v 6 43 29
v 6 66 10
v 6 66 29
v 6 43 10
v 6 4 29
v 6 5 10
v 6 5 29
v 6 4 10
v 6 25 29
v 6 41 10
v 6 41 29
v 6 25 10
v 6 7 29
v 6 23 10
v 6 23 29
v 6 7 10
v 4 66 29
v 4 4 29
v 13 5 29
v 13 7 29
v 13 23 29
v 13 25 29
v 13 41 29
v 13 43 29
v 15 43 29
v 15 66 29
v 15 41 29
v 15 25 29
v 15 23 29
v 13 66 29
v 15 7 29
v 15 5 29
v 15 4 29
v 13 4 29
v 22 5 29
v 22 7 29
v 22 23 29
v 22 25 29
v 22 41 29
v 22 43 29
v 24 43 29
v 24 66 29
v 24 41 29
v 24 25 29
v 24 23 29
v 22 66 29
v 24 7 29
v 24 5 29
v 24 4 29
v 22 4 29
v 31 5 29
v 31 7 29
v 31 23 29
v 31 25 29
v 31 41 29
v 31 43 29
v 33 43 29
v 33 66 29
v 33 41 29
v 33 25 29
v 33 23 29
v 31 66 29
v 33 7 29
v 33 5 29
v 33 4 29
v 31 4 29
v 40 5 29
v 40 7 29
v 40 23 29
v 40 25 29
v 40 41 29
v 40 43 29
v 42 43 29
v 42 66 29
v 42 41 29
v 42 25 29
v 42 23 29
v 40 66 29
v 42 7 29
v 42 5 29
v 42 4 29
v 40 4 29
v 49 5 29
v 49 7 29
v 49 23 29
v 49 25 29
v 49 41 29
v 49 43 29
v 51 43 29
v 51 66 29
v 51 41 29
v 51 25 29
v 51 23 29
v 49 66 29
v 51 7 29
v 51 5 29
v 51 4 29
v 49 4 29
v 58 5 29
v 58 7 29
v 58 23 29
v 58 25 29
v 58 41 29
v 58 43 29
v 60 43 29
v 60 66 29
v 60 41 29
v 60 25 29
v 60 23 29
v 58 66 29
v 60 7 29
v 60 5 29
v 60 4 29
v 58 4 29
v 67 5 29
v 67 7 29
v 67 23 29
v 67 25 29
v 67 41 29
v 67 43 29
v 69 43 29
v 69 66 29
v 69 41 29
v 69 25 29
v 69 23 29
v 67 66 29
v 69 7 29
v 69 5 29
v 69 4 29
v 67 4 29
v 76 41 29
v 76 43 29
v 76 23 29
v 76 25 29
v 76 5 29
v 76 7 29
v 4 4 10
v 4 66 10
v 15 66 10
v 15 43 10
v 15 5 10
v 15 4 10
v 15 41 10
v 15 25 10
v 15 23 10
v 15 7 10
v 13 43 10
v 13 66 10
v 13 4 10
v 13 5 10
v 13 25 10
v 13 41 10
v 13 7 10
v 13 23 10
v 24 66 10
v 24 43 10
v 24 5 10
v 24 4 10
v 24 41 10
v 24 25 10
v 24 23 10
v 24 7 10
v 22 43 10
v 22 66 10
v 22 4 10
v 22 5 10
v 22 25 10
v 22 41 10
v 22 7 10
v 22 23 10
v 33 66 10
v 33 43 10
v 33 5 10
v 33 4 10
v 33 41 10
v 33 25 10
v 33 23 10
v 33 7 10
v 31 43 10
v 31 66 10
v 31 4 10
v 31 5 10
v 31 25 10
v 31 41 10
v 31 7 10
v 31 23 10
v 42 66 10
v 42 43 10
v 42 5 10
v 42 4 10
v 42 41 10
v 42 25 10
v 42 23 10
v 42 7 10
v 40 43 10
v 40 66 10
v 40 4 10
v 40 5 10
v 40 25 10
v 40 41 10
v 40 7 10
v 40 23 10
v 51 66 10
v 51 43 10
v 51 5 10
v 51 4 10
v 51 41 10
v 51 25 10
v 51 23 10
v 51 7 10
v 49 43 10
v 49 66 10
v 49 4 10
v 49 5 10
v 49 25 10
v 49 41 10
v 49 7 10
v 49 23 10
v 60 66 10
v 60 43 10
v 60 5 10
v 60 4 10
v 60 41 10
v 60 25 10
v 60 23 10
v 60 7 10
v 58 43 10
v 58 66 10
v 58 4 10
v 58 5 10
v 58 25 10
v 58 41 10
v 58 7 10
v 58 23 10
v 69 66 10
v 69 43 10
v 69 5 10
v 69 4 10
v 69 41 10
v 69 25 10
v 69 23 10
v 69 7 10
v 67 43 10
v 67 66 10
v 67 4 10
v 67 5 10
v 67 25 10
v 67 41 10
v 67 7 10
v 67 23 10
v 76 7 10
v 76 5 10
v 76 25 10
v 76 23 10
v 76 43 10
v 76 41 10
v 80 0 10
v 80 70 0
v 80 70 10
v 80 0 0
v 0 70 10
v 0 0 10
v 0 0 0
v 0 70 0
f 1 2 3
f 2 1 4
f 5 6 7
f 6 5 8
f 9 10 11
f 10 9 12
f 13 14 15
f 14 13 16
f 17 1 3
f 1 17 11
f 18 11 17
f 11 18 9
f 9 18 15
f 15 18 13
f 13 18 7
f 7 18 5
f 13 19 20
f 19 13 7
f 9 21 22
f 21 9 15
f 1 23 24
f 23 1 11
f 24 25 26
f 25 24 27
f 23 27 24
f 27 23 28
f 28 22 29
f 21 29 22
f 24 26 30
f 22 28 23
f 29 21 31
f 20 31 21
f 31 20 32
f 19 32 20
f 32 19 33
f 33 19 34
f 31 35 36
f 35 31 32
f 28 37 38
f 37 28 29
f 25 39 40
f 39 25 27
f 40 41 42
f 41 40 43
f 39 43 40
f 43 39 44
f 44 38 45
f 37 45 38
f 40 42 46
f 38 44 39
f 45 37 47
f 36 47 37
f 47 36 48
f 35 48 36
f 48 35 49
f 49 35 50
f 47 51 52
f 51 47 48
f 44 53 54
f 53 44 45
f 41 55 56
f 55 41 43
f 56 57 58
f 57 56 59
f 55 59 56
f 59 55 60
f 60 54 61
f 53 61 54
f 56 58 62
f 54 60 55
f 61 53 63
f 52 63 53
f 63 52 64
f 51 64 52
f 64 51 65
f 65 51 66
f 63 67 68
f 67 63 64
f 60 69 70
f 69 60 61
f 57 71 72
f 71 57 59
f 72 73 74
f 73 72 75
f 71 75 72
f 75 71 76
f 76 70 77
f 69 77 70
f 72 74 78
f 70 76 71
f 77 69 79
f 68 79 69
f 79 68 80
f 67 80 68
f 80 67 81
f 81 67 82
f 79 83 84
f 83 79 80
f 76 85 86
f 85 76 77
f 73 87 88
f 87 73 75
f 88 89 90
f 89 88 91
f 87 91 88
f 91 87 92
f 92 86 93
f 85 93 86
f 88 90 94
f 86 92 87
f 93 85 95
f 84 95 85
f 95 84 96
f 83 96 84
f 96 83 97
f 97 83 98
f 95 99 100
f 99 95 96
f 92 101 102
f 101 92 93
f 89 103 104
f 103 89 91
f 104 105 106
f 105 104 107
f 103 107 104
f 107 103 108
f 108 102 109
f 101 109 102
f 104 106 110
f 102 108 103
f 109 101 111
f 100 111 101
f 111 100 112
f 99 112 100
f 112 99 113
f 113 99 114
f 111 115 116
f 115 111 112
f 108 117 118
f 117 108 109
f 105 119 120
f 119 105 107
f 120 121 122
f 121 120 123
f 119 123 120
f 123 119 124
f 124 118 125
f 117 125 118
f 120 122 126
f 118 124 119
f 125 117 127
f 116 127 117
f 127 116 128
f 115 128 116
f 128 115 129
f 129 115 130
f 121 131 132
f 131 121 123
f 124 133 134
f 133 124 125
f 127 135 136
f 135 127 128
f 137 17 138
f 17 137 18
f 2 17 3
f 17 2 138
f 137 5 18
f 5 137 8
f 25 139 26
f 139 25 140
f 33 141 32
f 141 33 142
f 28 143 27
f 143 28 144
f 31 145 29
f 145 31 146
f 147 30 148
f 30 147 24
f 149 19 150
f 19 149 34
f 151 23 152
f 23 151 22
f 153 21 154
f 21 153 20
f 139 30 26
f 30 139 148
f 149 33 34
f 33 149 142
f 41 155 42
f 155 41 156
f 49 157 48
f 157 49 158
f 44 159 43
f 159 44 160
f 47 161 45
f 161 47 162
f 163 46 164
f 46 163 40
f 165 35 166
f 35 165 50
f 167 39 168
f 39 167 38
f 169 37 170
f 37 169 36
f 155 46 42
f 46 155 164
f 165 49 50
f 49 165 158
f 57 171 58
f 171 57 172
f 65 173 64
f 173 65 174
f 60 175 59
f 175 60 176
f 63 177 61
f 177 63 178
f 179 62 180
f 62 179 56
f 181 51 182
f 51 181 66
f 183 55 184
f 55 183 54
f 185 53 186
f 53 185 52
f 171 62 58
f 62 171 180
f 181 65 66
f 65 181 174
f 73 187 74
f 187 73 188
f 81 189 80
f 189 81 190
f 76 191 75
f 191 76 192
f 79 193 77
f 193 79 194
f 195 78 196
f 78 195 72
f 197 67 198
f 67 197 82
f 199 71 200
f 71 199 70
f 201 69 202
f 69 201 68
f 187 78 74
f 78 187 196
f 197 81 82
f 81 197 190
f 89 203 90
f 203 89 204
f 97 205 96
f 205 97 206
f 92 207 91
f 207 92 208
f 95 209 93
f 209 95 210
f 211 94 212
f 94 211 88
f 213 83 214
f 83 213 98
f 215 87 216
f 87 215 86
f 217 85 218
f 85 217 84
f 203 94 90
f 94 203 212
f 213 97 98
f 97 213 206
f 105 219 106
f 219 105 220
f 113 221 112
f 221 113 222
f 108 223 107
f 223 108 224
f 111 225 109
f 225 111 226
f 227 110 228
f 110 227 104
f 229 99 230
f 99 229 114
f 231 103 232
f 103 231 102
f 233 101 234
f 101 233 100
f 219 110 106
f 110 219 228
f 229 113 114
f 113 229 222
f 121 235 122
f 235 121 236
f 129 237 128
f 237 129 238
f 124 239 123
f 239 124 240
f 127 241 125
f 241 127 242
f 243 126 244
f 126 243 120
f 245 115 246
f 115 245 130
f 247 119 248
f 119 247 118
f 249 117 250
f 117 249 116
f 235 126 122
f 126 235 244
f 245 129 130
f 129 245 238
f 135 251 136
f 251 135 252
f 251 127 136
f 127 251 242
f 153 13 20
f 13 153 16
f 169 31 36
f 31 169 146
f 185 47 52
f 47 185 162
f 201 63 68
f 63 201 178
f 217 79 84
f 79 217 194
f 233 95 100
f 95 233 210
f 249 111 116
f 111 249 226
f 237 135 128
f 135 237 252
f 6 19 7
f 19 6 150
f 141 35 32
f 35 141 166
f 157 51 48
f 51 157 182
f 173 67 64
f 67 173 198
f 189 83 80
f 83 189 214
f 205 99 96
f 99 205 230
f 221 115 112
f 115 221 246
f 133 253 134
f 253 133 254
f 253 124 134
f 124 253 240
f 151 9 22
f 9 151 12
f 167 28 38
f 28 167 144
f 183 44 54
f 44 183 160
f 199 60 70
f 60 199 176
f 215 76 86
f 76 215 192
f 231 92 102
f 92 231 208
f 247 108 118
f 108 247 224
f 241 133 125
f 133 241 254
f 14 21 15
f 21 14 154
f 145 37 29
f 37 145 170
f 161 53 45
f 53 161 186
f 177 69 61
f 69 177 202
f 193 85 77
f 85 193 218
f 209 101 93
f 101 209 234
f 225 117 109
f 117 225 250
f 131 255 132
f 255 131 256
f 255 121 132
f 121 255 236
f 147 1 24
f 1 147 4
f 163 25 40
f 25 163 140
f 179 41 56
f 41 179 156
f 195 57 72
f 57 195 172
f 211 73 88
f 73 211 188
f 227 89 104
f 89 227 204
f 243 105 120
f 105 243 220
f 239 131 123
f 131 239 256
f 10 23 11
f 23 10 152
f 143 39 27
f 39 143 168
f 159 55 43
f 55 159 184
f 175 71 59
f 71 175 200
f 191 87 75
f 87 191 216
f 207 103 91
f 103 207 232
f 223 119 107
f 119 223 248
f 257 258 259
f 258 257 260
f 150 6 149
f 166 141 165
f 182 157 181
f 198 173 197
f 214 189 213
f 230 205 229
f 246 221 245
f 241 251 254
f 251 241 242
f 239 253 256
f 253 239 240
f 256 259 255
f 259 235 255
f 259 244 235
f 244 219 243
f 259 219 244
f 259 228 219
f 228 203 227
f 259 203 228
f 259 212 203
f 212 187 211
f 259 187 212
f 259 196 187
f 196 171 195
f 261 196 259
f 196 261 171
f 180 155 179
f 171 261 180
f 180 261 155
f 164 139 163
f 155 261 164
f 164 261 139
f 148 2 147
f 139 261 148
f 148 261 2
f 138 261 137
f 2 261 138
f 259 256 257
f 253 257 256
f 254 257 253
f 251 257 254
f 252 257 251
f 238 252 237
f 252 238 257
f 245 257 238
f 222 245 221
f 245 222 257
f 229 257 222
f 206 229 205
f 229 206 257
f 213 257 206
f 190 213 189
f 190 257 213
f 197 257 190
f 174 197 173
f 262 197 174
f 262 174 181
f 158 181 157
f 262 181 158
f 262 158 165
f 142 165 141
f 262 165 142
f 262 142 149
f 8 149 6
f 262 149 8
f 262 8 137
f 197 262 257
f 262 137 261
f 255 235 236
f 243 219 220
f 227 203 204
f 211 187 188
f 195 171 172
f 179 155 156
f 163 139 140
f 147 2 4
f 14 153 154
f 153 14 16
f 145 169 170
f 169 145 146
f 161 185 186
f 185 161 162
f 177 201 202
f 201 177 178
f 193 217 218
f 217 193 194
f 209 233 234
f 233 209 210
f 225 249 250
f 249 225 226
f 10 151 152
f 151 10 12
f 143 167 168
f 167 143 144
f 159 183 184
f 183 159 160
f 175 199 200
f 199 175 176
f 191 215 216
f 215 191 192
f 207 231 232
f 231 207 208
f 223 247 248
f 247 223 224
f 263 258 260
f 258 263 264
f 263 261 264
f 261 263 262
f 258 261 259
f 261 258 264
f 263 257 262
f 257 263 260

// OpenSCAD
$fn = 32;

// ----------------------------------------------------------------------
// Heatsink: cross fin block
// ----------------------------------------------------------------------

// --- parameters (mm) ---
base_l = 80;              // base length, X
base_w = 70;              // base width, Y
base_t = 10;              // base plate thickness
fin_h = 20;               // fin height above the base
fin_t = 2;                // fin thickness
edge = 4;                 // margin from the base ends
pitch = 9;                // fin pitch
rib_pitch = 18;           // cross rib pitch

n_fins = floor((base_l - 2 * edge - fin_t) / pitch) + 1;  // fin count
total_h = base_t + fin_h - 1;  // overall height
n_ribs = floor((base_w - 2 * edge) / rib_pitch);  // rib count

union() {
  cube([base_l, base_w, base_t]);
  for (i = [0 : n_fins - 1])
    translate([edge + i * pitch, edge, base_t - 1])
      cube([fin_t, base_w - 2 * edge, fin_h]);
  for (i = [0 : n_ribs - 1])
    translate([edge, edge + 1 + i * rib_pitch, base_t - 1])
      cube([base_l - 2 * edge, fin_t, fin_h]);
}
